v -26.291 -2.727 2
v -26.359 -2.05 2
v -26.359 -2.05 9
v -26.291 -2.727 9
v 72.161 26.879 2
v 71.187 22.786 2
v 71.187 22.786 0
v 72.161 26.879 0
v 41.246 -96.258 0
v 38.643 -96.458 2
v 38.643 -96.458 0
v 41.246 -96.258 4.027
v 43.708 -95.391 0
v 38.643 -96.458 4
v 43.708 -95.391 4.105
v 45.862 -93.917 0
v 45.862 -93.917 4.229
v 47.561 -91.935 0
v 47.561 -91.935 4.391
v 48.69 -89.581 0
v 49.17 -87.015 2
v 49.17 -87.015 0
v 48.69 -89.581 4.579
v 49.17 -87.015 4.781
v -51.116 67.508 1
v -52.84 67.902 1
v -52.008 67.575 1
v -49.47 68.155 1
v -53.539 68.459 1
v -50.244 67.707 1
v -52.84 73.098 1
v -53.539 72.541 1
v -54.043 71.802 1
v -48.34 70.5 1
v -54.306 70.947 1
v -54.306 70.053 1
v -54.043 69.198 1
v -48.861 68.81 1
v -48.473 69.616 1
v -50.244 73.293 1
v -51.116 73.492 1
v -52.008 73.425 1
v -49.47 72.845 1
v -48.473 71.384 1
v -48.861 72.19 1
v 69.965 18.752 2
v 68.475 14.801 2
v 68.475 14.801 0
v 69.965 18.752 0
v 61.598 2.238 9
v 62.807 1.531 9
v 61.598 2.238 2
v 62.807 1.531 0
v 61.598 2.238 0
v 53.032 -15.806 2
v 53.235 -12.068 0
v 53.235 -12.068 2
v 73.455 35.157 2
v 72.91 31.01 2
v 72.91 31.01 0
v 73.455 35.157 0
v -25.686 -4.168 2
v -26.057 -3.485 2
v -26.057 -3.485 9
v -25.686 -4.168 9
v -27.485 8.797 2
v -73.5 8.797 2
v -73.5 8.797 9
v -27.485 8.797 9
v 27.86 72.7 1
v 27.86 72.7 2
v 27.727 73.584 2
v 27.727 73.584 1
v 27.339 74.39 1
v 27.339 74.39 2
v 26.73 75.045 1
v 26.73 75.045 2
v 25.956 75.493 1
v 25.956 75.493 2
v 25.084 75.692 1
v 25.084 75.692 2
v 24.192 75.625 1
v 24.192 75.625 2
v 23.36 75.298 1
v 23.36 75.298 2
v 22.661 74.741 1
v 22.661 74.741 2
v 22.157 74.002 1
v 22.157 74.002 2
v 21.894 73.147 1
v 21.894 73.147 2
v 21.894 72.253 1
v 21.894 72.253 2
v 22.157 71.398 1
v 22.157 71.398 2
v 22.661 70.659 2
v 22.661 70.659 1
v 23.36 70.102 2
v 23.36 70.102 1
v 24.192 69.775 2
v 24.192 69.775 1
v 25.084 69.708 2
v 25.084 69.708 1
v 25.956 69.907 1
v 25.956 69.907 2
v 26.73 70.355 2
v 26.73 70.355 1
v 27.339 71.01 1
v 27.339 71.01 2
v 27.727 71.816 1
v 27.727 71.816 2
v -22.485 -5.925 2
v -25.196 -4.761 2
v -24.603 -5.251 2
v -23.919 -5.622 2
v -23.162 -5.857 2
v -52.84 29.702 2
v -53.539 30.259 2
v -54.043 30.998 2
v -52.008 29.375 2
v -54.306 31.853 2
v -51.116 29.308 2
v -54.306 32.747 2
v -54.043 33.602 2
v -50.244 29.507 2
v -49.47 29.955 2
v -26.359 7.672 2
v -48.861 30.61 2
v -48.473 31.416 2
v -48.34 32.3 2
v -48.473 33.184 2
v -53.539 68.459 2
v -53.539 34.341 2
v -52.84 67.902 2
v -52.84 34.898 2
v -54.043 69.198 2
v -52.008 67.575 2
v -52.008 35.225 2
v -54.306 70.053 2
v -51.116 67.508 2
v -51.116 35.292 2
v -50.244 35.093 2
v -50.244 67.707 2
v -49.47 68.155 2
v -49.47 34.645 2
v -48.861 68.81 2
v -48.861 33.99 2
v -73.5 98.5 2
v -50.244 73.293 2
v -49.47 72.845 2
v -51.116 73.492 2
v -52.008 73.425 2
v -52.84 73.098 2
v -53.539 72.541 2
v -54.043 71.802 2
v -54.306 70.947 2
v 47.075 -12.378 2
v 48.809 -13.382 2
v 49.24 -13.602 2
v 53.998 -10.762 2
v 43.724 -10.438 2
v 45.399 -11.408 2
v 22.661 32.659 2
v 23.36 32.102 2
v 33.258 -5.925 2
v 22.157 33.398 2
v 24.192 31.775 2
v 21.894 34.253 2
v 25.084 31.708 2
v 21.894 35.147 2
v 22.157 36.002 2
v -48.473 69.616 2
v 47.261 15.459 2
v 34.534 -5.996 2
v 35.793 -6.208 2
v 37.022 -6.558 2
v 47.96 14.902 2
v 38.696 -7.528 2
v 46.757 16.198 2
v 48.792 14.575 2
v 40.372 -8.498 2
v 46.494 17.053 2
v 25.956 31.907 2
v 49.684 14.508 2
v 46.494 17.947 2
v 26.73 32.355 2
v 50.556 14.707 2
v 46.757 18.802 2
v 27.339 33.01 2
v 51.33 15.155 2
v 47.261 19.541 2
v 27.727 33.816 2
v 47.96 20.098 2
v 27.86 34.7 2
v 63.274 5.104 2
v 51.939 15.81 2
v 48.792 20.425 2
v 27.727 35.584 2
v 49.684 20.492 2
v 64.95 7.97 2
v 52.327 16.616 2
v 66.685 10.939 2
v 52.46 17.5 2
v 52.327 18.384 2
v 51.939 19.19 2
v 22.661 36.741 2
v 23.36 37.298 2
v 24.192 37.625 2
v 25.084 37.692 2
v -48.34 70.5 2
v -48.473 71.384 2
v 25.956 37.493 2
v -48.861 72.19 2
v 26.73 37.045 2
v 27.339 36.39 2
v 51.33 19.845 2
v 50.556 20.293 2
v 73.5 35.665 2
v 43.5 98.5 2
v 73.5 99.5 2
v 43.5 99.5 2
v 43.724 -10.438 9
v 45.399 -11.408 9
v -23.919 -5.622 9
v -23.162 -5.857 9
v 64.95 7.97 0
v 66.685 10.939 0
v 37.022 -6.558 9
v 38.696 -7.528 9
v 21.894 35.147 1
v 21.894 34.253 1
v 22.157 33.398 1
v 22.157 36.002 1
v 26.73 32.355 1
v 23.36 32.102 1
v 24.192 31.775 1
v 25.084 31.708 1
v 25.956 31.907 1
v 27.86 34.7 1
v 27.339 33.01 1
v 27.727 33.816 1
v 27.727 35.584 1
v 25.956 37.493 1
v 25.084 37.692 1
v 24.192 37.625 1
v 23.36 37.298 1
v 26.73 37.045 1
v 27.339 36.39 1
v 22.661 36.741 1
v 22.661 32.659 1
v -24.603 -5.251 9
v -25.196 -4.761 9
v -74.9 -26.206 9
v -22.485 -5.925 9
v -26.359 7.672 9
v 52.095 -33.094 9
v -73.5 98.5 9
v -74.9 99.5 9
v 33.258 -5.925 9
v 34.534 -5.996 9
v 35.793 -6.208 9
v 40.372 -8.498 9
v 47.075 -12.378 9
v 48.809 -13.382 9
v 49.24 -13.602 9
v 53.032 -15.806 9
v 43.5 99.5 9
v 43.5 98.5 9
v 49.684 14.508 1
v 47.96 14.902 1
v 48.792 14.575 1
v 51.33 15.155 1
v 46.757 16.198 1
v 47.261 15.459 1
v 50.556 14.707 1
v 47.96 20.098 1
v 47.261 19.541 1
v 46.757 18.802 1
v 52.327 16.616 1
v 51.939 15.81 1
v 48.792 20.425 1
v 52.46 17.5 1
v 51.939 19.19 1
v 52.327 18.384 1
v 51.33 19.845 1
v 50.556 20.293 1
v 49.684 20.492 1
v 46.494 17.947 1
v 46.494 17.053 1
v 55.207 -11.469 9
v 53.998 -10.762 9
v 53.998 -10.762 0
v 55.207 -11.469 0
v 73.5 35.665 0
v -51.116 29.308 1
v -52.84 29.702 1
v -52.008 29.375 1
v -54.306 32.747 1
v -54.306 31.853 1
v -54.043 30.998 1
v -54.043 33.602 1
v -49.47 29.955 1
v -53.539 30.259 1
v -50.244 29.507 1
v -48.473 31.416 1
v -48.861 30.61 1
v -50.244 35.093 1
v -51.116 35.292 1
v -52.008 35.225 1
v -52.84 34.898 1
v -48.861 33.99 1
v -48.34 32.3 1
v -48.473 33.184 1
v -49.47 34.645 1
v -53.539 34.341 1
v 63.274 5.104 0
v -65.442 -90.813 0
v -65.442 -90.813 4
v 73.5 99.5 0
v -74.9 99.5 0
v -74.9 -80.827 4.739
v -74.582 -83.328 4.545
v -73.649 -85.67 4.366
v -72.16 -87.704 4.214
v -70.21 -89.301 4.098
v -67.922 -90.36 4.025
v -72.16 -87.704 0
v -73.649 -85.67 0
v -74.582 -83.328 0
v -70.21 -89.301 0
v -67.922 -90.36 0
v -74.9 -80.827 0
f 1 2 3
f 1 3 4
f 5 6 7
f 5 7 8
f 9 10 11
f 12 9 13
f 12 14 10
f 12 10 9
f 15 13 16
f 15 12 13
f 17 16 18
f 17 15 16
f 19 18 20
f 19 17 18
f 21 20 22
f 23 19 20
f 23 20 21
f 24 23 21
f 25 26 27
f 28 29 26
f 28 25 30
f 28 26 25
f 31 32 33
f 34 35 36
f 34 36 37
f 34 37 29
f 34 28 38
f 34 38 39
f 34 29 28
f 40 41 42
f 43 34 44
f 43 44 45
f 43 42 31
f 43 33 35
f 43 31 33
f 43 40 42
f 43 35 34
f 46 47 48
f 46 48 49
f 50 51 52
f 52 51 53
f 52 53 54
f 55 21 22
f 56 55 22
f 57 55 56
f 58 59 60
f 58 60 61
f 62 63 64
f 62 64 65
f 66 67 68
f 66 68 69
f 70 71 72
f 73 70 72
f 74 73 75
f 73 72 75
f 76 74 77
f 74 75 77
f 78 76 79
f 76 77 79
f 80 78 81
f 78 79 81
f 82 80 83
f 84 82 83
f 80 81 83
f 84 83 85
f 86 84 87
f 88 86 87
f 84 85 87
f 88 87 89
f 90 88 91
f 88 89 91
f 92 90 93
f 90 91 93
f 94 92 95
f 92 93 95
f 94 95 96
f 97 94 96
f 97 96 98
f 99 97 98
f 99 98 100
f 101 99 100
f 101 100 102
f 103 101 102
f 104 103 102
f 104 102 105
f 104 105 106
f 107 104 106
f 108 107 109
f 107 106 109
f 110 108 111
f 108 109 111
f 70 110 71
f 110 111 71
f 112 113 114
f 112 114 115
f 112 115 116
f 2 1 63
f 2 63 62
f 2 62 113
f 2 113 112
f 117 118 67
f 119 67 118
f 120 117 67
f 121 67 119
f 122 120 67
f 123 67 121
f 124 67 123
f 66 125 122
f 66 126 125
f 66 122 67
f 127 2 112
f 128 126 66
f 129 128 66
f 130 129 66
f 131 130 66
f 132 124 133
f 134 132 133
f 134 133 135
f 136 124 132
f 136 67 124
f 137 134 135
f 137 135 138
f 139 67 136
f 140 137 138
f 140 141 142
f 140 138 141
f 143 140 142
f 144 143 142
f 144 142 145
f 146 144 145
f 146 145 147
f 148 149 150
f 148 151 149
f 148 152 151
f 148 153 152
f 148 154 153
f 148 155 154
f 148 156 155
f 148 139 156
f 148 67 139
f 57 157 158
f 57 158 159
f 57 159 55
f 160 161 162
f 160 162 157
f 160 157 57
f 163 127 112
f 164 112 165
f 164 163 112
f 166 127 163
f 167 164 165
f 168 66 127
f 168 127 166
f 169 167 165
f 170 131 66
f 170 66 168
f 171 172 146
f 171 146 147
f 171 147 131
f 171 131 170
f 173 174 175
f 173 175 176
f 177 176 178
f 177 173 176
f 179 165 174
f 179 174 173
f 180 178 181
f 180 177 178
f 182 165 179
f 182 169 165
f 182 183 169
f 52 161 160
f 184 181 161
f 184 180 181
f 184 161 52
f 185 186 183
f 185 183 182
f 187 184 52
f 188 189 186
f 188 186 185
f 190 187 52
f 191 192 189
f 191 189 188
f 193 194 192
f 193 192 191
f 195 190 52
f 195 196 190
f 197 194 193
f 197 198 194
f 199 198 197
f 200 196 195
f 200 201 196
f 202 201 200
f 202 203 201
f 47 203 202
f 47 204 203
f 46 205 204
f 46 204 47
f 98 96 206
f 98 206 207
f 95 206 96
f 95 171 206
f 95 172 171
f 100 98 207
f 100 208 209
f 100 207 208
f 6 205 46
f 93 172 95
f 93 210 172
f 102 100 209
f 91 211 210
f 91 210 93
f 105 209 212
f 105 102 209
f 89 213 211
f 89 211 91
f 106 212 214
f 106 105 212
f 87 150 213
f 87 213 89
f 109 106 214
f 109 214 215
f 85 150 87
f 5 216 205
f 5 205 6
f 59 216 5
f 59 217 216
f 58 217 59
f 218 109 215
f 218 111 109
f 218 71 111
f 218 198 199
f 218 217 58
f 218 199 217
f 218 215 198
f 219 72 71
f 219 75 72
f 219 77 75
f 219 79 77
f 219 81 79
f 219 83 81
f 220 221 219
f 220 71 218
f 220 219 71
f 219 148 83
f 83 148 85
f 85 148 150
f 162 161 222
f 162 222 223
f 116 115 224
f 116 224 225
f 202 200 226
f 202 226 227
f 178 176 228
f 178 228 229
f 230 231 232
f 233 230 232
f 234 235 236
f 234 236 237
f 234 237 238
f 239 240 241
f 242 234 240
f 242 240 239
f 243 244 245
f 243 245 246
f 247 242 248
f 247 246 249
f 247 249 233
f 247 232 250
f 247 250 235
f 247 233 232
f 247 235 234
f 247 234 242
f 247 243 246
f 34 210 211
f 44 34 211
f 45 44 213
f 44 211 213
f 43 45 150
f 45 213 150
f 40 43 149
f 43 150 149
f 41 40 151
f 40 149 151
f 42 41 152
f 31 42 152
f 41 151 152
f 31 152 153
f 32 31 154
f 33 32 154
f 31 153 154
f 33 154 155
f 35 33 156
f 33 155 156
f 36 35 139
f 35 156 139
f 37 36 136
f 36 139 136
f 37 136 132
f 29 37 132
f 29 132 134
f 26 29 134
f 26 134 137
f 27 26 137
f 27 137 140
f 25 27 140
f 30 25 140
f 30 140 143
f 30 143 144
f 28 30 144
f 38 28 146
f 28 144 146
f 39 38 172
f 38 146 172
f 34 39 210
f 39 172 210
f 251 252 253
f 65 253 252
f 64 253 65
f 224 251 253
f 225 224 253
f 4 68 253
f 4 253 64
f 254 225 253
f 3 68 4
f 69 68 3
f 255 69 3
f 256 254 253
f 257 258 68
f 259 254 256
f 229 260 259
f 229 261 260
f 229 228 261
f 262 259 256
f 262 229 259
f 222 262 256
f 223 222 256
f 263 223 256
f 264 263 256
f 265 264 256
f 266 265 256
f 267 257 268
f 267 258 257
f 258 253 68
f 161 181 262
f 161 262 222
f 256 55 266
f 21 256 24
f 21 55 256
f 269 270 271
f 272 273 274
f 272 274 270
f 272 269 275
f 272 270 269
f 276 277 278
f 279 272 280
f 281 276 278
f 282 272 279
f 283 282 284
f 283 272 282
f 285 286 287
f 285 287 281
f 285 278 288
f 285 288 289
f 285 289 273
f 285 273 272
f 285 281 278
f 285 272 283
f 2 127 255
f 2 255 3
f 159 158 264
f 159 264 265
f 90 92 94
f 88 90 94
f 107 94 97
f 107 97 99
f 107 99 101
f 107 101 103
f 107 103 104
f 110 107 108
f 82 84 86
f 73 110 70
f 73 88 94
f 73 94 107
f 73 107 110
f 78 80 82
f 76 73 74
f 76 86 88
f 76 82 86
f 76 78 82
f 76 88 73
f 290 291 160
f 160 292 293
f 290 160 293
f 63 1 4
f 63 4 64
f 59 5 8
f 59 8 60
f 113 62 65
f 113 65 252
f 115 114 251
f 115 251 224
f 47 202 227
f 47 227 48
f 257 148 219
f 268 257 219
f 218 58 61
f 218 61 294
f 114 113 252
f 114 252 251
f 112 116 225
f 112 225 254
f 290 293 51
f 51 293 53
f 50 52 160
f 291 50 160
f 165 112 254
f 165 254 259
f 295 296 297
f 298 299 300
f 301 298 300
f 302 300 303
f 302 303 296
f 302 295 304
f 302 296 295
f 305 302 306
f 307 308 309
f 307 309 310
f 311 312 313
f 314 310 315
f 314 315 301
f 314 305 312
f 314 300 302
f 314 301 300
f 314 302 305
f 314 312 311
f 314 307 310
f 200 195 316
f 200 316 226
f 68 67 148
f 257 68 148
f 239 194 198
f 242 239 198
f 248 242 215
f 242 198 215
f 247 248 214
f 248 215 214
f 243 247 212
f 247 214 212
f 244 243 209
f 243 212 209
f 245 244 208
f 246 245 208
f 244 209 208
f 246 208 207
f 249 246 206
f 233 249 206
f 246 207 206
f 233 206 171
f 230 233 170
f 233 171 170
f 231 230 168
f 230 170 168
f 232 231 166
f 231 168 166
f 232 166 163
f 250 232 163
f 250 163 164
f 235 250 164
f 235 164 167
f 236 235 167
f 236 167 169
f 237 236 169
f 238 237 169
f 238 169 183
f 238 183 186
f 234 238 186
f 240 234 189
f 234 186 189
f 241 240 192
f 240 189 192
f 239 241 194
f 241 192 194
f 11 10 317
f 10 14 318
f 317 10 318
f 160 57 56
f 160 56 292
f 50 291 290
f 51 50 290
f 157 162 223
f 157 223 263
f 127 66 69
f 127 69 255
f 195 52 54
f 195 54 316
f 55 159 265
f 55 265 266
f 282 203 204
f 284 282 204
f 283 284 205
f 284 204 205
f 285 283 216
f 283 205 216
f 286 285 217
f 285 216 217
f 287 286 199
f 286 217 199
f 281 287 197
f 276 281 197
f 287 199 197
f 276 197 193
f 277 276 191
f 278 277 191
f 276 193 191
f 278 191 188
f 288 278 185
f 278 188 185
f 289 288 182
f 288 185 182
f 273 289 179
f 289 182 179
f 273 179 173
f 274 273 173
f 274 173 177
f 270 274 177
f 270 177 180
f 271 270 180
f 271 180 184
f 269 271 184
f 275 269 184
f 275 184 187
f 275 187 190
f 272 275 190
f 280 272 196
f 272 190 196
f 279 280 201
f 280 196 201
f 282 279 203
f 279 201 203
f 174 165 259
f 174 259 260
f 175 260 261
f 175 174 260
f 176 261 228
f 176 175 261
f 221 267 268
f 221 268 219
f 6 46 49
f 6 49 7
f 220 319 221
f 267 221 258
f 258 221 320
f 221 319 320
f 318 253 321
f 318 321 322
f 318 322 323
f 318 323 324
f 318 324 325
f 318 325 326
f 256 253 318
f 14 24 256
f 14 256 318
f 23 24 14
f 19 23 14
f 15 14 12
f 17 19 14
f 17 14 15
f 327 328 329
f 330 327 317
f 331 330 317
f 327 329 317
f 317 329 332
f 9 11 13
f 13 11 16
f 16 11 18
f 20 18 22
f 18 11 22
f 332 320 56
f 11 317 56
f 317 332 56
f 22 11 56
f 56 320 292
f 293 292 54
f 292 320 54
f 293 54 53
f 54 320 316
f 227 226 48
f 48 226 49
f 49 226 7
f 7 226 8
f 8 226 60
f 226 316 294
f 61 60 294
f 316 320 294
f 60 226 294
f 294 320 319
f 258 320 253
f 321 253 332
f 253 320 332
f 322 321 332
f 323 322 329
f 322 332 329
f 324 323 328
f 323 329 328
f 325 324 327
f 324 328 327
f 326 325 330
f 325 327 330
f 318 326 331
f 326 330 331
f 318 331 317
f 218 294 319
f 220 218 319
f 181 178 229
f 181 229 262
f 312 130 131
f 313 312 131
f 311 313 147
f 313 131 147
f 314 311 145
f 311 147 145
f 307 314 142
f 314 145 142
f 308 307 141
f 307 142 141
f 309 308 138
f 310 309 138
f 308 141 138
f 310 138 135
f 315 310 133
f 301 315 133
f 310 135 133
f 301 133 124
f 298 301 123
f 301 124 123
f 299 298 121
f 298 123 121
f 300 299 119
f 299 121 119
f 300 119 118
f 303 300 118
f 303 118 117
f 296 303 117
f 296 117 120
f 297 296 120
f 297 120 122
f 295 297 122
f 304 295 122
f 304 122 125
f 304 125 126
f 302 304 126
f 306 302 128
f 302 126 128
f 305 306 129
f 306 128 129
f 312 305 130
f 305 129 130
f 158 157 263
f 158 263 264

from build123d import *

# Parameters (mm, degrees)
SKETCH_1_W          = 147
SKETCH_1_H          = 194
EXTRUDE_1_DEPTH     = 2
CUT_EXTRUDE_1_DEPTH = 122.717911582
EXTRUDE_2_DEPTH     = 7
EXTRUDE_12_DEPTH    = 2
EXTRUDE_13_DEPTH    = 7
SKETCH_9_W          = 30
SKETCH_9_H          = 7
CUT_EXTRUDE_2_DEPTH = 8
CUT_EXTRUDE_3_DEPTH = 165.668883446
CUT_EXTRUDE_4_DEPTH = 125.640523105
FILLET_1_R          = 10
SKETCH_15_R         = 3
CUT_EXTRUDE_5_DEPTH = 1


with BuildPart() as part:
    # 草图1 → 凸台-拉伸1 (new body)
    with BuildSketch(Plane.XY):
        Rectangle(SKETCH_1_W, SKETCH_1_H)
    extrude(amount=EXTRUDE_1_DEPTH)

    # 草图3 → 切除-拉伸1 (cut, through all)
    with BuildSketch(Plane.XY.offset(2)):
        Polygon((53.23522436, -12.067612089), (54.895536272, -9.227626556), (56.571241133, -6.361232674), (59.922644339, -0.628613065), (61.598241137, 2.237687122), (63.273937257, 5.103974498), (64.949644621, 7.97037266), (66.685320016, 10.939281948), (68.474937854, 14.800520519), (69.965464928, 18.751847603), (71.186607188, 22.785544771), (72.160677785, 26.878843337), (72.909711272, 31.009687619), (73.455390422, 35.156598129), (73.81891313, 39.298369912), (74.02249192, 43.433108573), (74.02249192, 45), (75.723074591, 45), (75.723074591, -104.819726649), (48.204220565, -104.819726649), align=None)
    extrude(amount=-CUT_EXTRUDE_1_DEPTH, mode=Mode.SUBTRACT)

    # 草图4 → 凸台-拉伸2 (add)
    with BuildSketch(Plane.XY.offset(2)):
        with BuildLine():
            Line((-26.359304292, 7.671510526), (-26.359304292, -2.050234399))
            Line((-26.359304292, -2.050234399), (-26.291229671, -2.727324911))
            Line((-26.291229671, -2.727324911), (-26.056539241, -3.484651495))
            Line((-26.056539241, -3.484651495), (-25.685607127, -4.168114429))
            Line((-25.685607127, -4.168114429), (-25.196433295, -4.761489945))
            Line((-25.196433295, -4.761489945), (-24.602579713, -5.251299759))
            Line((-24.602579713, -5.251299759), (-23.918848604, -5.622103659))
            Line((-23.918848604, -5.622103659), (-23.16220103, -5.856620758))
            Line((-23.16220103, -5.856620758), (-22.484966559, -5.924875416))
            Line((-22.484966559, -5.924875416), (33.258451472, -5.924875416))
            ThreePointArc((33.258451472, -5.924875416), (35.166456954, -6.084261893), (37.021573693, -6.558003228))
            Line((37.021573693, -6.558003228), (38.696489946, -7.527643824))
            Line((38.696489946, -7.527643824), (40.372194808, -8.497858613))
            Line((40.372194808, -8.497858613), (43.723589271, -10.43804405))
            Line((43.723589271, -10.43804405), (45.399266369, -11.408242764))
            Line((45.399266369, -11.408242764), (47.074877038, -12.378342789))
            Line((47.074877038, -12.378342789), (48.808729273, -13.382197265))
            Line((48.808729273, -13.382197265), (49.23970493, -13.601689934))
            Line((49.23970493, -13.601689934), (53.032447862, -15.806020922))
            Line((53.032447862, -15.806020922), (48.628373423, -97))
            Line((48.628373423, -97), (-73.5, -97))
            Line((-73.5, -97), (-73.5, 8.797108615))
            Line((-73.5, 8.797108615), (-69.625285972, 8.797108615))
            Line((-69.625285972, 8.797108615), (-27.484917142, 8.797108615))
            Line((-27.484917142, 8.797108615), (-26.359304292, 7.671510526))
        make_face()
    extrude(amount=EXTRUDE_2_DEPTH)

    # 草图6 → 凸台-拉伸12 (add)
    with BuildSketch(Plane(origin=(0, 0, 0), x_dir=(-1, 0, 0), z_dir=(0, 0, -1))):
        Polygon((-61.598241137, 2.237687122), (-53.998328187, -10.762312878), (-55.206947225, -11.468882068), (-62.806860175, 1.531117932), align=None)
        Polygon((-73.5, 97), (73.5, 97), (73.5, -97), (74.9, -97), (74.9, 87), (74.9, 99.5), (-73.5, 99.5), align=None)
    extrude(amount=-EXTRUDE_12_DEPTH)

    # 草图7 → 凸台-拉伸13 (add)
    with BuildSketch(Plane.XY.offset(2)):
        Polygon((-74.9, 99.5), (-74.9, -97), (-73.5, -97), (-73.5, 98.5), (73.5, 98.5), (73.5, 99.5), align=None)
        Polygon((61.598241137, 2.237687122), (53.998328187, -10.762312878), (55.206947225, -11.468882068), (62.806860175, 1.531117932), align=None)
    extrude(amount=EXTRUDE_13_DEPTH)

    # 草图9 → 切除-拉伸2 (cut)
    with BuildSketch(Plane(origin=(0, 99.5, 0), x_dir=(1, 0, 0), z_dir=(0, 1, 0))):
        with Locations((58.5, -5.5)):
            Rectangle(SKETCH_9_W, SKETCH_9_H)
    extrude(amount=-CUT_EXTRUDE_2_DEPTH, mode=Mode.SUBTRACT)

    # 草图10 → 切除-拉伸3 (cut, through all)
    with BuildSketch(Plane(origin=(53.731702858, -2.914482352, 0), x_dir=(0, 0, -1), z_dir=(0.9985321738095838, -0.054161774962672445, 0))):
        Polygon((-9, -30.223821841), (-4, -94.223821841), (-4, -111.514790755), (-9, -111.514790755), (-9, -94.223821841), align=None)
    extrude(amount=-CUT_EXTRUDE_3_DEPTH, mode=Mode.SUBTRACT)

    # 草图11 → 切除-拉伸4 (cut, through all)
    with BuildSketch(Plane.XY.offset(4)):
        Polygon((-74.9, -90.299649087), (-74.9, -97), (48.628373423, -97), align=None)
    extrude(amount=-CUT_EXTRUDE_4_DEPTH, mode=Mode.SUBTRACT)

    # 圆角1
    fillet_1_edges = [part.edges().sort_by_distance(p)[0] for p in [
        (-74.9, -90.299649087, 2),
        (48.628373423, -97, 2),
    ]]
    fillet(fillet_1_edges, radius=FILLET_1_R)

    # 草图15 → 切除-拉伸5 (cut)
    with BuildSketch(Plane.XY.offset(2)):
        with Locations((-51.34000037, 70.5)):
            Circle(SKETCH_15_R)
        with Locations((-51.34000037, 32.300001397)):
            Circle(SKETCH_15_R)
        with Locations((24.859996084, 72.7)):
            Circle(SKETCH_15_R)
        with Locations((24.859996084, 34.700002149)):
            Circle(SKETCH_15_R)
        with Locations((49.459993167, 17.5)):
            Circle(SKETCH_15_R)
    extrude(amount=-CUT_EXTRUDE_5_DEPTH, mode=Mode.SUBTRACT)


solid = part.part
